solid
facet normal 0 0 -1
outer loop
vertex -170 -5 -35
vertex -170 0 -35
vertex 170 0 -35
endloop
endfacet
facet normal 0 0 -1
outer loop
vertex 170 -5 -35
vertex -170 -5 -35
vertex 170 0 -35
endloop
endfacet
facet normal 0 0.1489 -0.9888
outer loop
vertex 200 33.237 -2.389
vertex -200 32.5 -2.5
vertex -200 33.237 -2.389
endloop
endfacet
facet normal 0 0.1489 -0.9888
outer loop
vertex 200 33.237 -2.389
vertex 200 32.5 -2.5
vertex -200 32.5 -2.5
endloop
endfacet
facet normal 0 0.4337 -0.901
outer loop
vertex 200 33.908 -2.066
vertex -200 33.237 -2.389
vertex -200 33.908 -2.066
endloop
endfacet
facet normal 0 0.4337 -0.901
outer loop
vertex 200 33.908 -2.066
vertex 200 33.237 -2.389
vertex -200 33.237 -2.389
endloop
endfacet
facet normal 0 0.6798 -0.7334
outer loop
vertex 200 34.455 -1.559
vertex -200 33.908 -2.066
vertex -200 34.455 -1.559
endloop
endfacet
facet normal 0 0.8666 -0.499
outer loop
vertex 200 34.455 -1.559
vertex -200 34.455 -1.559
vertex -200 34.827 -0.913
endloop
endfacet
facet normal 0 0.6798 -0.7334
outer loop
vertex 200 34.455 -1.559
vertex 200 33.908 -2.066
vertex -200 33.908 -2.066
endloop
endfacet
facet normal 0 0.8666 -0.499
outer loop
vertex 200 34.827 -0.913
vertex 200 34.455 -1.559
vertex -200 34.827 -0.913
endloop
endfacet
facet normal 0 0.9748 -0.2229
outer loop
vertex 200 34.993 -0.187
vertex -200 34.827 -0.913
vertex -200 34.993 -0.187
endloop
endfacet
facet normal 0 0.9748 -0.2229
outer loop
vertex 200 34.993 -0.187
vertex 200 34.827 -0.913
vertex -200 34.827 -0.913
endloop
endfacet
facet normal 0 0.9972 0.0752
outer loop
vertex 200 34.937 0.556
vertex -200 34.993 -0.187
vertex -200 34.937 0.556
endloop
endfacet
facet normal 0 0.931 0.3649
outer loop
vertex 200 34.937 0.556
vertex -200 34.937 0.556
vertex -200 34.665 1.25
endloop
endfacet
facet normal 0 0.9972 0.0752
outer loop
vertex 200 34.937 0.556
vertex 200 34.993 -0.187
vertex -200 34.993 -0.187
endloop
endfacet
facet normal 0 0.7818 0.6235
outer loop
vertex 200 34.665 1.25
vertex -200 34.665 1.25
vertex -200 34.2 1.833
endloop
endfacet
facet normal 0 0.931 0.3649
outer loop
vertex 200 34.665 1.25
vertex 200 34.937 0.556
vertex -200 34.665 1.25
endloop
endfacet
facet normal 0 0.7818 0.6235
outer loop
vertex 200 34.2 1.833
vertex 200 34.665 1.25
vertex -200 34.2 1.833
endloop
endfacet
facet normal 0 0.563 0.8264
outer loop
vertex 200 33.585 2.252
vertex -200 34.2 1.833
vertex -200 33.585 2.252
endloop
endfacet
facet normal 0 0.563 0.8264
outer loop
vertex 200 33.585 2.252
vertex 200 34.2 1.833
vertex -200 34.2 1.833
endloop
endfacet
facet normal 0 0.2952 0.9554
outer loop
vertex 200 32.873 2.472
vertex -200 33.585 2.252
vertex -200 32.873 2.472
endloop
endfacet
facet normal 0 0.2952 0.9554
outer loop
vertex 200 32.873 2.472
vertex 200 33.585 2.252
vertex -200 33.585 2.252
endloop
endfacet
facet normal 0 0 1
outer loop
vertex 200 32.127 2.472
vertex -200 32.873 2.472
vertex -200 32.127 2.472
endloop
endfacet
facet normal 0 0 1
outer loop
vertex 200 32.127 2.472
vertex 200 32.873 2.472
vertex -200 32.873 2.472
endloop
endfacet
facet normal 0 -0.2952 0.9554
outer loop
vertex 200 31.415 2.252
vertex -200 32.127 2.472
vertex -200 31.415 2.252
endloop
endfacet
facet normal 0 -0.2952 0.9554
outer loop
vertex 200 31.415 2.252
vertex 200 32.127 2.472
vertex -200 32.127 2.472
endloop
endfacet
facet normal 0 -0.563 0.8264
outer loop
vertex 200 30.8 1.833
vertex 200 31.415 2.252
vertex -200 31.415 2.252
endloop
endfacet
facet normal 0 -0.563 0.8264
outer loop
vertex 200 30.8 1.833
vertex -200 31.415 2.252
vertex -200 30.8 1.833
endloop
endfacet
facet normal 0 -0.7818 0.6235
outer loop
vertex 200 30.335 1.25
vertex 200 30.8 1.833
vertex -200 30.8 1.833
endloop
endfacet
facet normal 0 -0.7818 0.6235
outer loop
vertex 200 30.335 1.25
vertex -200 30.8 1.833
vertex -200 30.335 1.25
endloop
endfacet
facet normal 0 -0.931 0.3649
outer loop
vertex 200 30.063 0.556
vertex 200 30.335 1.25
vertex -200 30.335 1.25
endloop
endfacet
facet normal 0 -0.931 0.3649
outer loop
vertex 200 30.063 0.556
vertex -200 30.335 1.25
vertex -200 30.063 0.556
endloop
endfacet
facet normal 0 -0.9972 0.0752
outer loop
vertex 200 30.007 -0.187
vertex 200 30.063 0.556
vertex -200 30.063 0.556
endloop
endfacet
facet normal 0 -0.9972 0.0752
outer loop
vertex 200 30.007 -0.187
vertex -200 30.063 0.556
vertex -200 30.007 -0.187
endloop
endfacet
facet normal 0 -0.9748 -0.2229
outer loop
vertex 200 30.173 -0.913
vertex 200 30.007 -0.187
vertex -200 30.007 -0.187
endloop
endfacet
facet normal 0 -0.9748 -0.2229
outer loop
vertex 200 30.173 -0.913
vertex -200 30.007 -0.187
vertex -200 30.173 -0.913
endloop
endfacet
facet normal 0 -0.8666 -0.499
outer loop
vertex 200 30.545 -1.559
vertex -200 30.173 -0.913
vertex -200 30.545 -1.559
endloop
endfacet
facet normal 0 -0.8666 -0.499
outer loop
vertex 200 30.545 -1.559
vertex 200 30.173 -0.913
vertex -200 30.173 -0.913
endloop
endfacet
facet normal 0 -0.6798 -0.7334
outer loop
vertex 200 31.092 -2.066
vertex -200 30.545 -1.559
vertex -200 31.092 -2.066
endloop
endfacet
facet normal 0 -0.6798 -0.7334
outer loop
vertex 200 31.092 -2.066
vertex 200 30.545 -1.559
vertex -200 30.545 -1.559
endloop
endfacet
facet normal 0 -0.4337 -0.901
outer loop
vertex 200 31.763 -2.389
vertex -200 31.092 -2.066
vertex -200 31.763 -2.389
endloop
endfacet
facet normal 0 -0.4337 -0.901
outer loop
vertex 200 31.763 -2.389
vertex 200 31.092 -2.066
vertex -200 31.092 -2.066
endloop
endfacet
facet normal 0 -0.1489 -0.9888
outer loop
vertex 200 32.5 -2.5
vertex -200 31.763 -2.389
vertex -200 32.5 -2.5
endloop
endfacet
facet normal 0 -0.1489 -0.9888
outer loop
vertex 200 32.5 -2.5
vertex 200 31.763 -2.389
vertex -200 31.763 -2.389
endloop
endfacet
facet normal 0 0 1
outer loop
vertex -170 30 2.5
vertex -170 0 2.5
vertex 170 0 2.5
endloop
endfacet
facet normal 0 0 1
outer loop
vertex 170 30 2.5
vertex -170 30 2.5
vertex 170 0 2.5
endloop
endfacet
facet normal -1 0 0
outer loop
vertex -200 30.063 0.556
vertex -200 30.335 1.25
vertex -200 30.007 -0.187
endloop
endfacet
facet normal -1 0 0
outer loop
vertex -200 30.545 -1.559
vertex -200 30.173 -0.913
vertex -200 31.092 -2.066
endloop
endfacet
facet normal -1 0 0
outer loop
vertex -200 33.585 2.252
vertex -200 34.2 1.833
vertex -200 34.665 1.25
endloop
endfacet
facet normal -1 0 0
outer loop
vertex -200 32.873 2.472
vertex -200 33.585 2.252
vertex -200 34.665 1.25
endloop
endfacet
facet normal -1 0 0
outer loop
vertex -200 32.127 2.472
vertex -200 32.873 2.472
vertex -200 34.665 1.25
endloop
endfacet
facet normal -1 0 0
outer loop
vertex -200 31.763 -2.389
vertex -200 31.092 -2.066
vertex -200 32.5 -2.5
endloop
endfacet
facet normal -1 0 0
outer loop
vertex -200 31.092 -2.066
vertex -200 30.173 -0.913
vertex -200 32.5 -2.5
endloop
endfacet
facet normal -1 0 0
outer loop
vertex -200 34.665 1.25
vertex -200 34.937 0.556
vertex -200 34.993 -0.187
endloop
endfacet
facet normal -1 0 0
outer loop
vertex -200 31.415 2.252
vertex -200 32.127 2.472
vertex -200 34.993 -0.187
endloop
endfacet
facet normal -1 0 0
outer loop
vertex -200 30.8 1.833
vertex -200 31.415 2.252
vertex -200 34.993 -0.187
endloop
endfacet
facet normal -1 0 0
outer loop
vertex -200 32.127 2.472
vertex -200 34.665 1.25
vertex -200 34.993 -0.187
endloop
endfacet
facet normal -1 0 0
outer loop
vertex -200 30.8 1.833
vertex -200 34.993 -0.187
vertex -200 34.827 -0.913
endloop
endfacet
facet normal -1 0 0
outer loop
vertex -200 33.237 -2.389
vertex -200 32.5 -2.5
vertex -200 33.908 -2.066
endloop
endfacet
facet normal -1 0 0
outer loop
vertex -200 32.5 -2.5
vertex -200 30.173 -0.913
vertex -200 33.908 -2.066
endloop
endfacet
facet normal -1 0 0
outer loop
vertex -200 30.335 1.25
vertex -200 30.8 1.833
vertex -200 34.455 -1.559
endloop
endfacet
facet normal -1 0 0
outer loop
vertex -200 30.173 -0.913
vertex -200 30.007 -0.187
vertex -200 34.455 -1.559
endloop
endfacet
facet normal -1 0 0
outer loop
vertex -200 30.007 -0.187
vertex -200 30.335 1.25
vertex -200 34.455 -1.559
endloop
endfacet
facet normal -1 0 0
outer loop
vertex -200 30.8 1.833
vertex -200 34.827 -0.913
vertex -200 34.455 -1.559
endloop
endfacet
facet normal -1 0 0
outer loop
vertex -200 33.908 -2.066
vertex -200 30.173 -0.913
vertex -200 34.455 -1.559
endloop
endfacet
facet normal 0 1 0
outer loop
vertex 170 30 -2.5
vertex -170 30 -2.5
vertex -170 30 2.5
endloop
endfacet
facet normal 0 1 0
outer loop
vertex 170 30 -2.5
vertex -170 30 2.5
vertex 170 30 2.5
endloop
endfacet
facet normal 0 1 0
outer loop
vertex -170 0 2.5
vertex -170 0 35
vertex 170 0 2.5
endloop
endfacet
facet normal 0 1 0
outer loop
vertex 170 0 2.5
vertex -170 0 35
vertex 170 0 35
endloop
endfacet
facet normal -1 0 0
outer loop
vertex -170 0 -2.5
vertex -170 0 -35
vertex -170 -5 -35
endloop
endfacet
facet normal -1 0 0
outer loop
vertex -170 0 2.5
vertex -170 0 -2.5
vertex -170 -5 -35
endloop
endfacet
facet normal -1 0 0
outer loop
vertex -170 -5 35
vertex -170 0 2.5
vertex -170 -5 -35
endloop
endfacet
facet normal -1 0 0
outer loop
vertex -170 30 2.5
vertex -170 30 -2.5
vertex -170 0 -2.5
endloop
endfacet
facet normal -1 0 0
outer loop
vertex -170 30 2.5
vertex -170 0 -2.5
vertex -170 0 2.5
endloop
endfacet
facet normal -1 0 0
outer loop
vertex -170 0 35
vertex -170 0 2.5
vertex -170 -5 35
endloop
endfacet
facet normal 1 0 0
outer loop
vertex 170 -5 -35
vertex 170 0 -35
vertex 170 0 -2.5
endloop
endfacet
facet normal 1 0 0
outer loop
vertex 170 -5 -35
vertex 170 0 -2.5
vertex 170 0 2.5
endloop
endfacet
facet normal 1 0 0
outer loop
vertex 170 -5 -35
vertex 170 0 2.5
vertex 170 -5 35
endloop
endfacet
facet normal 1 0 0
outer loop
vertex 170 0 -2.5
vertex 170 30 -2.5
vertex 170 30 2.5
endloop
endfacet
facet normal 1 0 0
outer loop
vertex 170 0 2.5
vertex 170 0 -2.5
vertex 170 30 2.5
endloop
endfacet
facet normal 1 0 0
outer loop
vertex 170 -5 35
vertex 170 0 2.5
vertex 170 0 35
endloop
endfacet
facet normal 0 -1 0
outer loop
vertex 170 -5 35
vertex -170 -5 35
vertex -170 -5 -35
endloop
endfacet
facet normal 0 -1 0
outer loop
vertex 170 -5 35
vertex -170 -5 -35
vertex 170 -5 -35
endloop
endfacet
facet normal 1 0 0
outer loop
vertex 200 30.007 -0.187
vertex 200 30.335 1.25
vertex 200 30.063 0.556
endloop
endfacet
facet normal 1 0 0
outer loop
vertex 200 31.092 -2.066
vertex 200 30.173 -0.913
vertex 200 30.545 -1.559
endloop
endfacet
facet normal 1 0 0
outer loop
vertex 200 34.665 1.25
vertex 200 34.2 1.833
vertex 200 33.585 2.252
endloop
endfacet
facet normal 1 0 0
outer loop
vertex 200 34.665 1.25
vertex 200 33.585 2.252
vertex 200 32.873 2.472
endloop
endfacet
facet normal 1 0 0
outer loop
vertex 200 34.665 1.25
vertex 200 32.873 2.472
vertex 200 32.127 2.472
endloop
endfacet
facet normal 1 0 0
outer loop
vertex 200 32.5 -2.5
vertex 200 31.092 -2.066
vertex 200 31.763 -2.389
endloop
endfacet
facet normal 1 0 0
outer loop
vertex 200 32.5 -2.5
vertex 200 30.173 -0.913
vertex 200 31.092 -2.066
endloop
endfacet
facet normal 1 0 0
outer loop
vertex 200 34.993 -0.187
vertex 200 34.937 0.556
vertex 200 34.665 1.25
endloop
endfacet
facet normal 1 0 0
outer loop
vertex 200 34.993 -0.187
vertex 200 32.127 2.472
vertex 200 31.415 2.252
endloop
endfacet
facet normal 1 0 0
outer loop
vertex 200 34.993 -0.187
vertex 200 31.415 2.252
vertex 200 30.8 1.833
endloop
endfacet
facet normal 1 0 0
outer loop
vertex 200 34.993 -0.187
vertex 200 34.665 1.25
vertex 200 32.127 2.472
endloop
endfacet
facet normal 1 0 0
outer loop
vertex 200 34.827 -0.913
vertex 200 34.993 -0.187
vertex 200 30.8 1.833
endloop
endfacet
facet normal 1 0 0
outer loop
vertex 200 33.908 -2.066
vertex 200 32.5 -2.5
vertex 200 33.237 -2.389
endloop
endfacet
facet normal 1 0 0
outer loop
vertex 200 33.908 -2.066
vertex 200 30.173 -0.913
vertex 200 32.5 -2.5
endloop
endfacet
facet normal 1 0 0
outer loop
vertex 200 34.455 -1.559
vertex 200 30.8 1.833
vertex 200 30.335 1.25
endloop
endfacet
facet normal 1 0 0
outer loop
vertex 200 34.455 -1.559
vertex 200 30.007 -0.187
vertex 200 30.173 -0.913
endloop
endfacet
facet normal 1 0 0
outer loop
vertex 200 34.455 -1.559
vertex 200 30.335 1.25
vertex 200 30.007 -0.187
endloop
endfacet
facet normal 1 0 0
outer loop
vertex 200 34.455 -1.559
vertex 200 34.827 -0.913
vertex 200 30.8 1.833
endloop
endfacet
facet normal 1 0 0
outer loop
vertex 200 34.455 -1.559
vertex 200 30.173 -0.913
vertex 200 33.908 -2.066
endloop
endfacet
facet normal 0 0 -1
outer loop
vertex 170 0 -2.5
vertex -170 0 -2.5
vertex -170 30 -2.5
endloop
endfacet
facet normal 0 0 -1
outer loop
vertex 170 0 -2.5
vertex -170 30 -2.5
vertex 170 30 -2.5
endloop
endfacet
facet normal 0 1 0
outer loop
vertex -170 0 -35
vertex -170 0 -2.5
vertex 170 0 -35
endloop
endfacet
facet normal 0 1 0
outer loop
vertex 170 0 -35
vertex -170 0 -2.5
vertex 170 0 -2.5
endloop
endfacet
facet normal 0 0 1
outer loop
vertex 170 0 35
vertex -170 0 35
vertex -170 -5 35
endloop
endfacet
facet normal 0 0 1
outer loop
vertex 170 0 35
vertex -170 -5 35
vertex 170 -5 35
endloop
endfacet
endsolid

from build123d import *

# Parameters (mm, degrees)
SKETCH1_W                = 340
SKETCH1_H                = 5
BOSS_EXTRUDE1_DEPTH      = 30
SKETCH2_R                = 2.5
BOSS_EXTRUDE2_DEPTH      = 30
BOSS_EXTRUDE2_DEPTH_BACK = 370
SKETCH3_W                = 340
SKETCH3_H                = 70
BOSS_EXTRUDE3_DEPTH      = 5


with BuildPart() as part:
    # Sketch1 → Boss-Extrude1 (new body)
    with BuildSketch(Plane(origin=(0, 0, 0), x_dir=(1, 0, 0), z_dir=(0, 1, 0))):
        Rectangle(SKETCH1_W, SKETCH1_H)
    extrude(amount=BOSS_EXTRUDE1_DEPTH)

    # Sketch3 → Boss-Extrude3 (add)
    with BuildSketch(Plane.XZ):
        Rectangle(SKETCH3_W, SKETCH3_H)
    extrude(amount=BOSS_EXTRUDE3_DEPTH)


with BuildPart() as body_2:
    # Sketch2 → Boss-Extrude2 (new body, two sides)
    with BuildSketch(Plane(origin=(170, 0, 0), x_dir=(0, 0, -1), z_dir=(1, 0, 0))) as boss_extrude2_sk:
        with Locations((0, 32.5)):
            Circle(SKETCH2_R)
    extrude(amount=BOSS_EXTRUDE2_DEPTH)
    extrude(boss_extrude2_sk.sketch, amount=-BOSS_EXTRUDE2_DEPTH_BACK)


solid = Compound([part.part, body_2.part])
